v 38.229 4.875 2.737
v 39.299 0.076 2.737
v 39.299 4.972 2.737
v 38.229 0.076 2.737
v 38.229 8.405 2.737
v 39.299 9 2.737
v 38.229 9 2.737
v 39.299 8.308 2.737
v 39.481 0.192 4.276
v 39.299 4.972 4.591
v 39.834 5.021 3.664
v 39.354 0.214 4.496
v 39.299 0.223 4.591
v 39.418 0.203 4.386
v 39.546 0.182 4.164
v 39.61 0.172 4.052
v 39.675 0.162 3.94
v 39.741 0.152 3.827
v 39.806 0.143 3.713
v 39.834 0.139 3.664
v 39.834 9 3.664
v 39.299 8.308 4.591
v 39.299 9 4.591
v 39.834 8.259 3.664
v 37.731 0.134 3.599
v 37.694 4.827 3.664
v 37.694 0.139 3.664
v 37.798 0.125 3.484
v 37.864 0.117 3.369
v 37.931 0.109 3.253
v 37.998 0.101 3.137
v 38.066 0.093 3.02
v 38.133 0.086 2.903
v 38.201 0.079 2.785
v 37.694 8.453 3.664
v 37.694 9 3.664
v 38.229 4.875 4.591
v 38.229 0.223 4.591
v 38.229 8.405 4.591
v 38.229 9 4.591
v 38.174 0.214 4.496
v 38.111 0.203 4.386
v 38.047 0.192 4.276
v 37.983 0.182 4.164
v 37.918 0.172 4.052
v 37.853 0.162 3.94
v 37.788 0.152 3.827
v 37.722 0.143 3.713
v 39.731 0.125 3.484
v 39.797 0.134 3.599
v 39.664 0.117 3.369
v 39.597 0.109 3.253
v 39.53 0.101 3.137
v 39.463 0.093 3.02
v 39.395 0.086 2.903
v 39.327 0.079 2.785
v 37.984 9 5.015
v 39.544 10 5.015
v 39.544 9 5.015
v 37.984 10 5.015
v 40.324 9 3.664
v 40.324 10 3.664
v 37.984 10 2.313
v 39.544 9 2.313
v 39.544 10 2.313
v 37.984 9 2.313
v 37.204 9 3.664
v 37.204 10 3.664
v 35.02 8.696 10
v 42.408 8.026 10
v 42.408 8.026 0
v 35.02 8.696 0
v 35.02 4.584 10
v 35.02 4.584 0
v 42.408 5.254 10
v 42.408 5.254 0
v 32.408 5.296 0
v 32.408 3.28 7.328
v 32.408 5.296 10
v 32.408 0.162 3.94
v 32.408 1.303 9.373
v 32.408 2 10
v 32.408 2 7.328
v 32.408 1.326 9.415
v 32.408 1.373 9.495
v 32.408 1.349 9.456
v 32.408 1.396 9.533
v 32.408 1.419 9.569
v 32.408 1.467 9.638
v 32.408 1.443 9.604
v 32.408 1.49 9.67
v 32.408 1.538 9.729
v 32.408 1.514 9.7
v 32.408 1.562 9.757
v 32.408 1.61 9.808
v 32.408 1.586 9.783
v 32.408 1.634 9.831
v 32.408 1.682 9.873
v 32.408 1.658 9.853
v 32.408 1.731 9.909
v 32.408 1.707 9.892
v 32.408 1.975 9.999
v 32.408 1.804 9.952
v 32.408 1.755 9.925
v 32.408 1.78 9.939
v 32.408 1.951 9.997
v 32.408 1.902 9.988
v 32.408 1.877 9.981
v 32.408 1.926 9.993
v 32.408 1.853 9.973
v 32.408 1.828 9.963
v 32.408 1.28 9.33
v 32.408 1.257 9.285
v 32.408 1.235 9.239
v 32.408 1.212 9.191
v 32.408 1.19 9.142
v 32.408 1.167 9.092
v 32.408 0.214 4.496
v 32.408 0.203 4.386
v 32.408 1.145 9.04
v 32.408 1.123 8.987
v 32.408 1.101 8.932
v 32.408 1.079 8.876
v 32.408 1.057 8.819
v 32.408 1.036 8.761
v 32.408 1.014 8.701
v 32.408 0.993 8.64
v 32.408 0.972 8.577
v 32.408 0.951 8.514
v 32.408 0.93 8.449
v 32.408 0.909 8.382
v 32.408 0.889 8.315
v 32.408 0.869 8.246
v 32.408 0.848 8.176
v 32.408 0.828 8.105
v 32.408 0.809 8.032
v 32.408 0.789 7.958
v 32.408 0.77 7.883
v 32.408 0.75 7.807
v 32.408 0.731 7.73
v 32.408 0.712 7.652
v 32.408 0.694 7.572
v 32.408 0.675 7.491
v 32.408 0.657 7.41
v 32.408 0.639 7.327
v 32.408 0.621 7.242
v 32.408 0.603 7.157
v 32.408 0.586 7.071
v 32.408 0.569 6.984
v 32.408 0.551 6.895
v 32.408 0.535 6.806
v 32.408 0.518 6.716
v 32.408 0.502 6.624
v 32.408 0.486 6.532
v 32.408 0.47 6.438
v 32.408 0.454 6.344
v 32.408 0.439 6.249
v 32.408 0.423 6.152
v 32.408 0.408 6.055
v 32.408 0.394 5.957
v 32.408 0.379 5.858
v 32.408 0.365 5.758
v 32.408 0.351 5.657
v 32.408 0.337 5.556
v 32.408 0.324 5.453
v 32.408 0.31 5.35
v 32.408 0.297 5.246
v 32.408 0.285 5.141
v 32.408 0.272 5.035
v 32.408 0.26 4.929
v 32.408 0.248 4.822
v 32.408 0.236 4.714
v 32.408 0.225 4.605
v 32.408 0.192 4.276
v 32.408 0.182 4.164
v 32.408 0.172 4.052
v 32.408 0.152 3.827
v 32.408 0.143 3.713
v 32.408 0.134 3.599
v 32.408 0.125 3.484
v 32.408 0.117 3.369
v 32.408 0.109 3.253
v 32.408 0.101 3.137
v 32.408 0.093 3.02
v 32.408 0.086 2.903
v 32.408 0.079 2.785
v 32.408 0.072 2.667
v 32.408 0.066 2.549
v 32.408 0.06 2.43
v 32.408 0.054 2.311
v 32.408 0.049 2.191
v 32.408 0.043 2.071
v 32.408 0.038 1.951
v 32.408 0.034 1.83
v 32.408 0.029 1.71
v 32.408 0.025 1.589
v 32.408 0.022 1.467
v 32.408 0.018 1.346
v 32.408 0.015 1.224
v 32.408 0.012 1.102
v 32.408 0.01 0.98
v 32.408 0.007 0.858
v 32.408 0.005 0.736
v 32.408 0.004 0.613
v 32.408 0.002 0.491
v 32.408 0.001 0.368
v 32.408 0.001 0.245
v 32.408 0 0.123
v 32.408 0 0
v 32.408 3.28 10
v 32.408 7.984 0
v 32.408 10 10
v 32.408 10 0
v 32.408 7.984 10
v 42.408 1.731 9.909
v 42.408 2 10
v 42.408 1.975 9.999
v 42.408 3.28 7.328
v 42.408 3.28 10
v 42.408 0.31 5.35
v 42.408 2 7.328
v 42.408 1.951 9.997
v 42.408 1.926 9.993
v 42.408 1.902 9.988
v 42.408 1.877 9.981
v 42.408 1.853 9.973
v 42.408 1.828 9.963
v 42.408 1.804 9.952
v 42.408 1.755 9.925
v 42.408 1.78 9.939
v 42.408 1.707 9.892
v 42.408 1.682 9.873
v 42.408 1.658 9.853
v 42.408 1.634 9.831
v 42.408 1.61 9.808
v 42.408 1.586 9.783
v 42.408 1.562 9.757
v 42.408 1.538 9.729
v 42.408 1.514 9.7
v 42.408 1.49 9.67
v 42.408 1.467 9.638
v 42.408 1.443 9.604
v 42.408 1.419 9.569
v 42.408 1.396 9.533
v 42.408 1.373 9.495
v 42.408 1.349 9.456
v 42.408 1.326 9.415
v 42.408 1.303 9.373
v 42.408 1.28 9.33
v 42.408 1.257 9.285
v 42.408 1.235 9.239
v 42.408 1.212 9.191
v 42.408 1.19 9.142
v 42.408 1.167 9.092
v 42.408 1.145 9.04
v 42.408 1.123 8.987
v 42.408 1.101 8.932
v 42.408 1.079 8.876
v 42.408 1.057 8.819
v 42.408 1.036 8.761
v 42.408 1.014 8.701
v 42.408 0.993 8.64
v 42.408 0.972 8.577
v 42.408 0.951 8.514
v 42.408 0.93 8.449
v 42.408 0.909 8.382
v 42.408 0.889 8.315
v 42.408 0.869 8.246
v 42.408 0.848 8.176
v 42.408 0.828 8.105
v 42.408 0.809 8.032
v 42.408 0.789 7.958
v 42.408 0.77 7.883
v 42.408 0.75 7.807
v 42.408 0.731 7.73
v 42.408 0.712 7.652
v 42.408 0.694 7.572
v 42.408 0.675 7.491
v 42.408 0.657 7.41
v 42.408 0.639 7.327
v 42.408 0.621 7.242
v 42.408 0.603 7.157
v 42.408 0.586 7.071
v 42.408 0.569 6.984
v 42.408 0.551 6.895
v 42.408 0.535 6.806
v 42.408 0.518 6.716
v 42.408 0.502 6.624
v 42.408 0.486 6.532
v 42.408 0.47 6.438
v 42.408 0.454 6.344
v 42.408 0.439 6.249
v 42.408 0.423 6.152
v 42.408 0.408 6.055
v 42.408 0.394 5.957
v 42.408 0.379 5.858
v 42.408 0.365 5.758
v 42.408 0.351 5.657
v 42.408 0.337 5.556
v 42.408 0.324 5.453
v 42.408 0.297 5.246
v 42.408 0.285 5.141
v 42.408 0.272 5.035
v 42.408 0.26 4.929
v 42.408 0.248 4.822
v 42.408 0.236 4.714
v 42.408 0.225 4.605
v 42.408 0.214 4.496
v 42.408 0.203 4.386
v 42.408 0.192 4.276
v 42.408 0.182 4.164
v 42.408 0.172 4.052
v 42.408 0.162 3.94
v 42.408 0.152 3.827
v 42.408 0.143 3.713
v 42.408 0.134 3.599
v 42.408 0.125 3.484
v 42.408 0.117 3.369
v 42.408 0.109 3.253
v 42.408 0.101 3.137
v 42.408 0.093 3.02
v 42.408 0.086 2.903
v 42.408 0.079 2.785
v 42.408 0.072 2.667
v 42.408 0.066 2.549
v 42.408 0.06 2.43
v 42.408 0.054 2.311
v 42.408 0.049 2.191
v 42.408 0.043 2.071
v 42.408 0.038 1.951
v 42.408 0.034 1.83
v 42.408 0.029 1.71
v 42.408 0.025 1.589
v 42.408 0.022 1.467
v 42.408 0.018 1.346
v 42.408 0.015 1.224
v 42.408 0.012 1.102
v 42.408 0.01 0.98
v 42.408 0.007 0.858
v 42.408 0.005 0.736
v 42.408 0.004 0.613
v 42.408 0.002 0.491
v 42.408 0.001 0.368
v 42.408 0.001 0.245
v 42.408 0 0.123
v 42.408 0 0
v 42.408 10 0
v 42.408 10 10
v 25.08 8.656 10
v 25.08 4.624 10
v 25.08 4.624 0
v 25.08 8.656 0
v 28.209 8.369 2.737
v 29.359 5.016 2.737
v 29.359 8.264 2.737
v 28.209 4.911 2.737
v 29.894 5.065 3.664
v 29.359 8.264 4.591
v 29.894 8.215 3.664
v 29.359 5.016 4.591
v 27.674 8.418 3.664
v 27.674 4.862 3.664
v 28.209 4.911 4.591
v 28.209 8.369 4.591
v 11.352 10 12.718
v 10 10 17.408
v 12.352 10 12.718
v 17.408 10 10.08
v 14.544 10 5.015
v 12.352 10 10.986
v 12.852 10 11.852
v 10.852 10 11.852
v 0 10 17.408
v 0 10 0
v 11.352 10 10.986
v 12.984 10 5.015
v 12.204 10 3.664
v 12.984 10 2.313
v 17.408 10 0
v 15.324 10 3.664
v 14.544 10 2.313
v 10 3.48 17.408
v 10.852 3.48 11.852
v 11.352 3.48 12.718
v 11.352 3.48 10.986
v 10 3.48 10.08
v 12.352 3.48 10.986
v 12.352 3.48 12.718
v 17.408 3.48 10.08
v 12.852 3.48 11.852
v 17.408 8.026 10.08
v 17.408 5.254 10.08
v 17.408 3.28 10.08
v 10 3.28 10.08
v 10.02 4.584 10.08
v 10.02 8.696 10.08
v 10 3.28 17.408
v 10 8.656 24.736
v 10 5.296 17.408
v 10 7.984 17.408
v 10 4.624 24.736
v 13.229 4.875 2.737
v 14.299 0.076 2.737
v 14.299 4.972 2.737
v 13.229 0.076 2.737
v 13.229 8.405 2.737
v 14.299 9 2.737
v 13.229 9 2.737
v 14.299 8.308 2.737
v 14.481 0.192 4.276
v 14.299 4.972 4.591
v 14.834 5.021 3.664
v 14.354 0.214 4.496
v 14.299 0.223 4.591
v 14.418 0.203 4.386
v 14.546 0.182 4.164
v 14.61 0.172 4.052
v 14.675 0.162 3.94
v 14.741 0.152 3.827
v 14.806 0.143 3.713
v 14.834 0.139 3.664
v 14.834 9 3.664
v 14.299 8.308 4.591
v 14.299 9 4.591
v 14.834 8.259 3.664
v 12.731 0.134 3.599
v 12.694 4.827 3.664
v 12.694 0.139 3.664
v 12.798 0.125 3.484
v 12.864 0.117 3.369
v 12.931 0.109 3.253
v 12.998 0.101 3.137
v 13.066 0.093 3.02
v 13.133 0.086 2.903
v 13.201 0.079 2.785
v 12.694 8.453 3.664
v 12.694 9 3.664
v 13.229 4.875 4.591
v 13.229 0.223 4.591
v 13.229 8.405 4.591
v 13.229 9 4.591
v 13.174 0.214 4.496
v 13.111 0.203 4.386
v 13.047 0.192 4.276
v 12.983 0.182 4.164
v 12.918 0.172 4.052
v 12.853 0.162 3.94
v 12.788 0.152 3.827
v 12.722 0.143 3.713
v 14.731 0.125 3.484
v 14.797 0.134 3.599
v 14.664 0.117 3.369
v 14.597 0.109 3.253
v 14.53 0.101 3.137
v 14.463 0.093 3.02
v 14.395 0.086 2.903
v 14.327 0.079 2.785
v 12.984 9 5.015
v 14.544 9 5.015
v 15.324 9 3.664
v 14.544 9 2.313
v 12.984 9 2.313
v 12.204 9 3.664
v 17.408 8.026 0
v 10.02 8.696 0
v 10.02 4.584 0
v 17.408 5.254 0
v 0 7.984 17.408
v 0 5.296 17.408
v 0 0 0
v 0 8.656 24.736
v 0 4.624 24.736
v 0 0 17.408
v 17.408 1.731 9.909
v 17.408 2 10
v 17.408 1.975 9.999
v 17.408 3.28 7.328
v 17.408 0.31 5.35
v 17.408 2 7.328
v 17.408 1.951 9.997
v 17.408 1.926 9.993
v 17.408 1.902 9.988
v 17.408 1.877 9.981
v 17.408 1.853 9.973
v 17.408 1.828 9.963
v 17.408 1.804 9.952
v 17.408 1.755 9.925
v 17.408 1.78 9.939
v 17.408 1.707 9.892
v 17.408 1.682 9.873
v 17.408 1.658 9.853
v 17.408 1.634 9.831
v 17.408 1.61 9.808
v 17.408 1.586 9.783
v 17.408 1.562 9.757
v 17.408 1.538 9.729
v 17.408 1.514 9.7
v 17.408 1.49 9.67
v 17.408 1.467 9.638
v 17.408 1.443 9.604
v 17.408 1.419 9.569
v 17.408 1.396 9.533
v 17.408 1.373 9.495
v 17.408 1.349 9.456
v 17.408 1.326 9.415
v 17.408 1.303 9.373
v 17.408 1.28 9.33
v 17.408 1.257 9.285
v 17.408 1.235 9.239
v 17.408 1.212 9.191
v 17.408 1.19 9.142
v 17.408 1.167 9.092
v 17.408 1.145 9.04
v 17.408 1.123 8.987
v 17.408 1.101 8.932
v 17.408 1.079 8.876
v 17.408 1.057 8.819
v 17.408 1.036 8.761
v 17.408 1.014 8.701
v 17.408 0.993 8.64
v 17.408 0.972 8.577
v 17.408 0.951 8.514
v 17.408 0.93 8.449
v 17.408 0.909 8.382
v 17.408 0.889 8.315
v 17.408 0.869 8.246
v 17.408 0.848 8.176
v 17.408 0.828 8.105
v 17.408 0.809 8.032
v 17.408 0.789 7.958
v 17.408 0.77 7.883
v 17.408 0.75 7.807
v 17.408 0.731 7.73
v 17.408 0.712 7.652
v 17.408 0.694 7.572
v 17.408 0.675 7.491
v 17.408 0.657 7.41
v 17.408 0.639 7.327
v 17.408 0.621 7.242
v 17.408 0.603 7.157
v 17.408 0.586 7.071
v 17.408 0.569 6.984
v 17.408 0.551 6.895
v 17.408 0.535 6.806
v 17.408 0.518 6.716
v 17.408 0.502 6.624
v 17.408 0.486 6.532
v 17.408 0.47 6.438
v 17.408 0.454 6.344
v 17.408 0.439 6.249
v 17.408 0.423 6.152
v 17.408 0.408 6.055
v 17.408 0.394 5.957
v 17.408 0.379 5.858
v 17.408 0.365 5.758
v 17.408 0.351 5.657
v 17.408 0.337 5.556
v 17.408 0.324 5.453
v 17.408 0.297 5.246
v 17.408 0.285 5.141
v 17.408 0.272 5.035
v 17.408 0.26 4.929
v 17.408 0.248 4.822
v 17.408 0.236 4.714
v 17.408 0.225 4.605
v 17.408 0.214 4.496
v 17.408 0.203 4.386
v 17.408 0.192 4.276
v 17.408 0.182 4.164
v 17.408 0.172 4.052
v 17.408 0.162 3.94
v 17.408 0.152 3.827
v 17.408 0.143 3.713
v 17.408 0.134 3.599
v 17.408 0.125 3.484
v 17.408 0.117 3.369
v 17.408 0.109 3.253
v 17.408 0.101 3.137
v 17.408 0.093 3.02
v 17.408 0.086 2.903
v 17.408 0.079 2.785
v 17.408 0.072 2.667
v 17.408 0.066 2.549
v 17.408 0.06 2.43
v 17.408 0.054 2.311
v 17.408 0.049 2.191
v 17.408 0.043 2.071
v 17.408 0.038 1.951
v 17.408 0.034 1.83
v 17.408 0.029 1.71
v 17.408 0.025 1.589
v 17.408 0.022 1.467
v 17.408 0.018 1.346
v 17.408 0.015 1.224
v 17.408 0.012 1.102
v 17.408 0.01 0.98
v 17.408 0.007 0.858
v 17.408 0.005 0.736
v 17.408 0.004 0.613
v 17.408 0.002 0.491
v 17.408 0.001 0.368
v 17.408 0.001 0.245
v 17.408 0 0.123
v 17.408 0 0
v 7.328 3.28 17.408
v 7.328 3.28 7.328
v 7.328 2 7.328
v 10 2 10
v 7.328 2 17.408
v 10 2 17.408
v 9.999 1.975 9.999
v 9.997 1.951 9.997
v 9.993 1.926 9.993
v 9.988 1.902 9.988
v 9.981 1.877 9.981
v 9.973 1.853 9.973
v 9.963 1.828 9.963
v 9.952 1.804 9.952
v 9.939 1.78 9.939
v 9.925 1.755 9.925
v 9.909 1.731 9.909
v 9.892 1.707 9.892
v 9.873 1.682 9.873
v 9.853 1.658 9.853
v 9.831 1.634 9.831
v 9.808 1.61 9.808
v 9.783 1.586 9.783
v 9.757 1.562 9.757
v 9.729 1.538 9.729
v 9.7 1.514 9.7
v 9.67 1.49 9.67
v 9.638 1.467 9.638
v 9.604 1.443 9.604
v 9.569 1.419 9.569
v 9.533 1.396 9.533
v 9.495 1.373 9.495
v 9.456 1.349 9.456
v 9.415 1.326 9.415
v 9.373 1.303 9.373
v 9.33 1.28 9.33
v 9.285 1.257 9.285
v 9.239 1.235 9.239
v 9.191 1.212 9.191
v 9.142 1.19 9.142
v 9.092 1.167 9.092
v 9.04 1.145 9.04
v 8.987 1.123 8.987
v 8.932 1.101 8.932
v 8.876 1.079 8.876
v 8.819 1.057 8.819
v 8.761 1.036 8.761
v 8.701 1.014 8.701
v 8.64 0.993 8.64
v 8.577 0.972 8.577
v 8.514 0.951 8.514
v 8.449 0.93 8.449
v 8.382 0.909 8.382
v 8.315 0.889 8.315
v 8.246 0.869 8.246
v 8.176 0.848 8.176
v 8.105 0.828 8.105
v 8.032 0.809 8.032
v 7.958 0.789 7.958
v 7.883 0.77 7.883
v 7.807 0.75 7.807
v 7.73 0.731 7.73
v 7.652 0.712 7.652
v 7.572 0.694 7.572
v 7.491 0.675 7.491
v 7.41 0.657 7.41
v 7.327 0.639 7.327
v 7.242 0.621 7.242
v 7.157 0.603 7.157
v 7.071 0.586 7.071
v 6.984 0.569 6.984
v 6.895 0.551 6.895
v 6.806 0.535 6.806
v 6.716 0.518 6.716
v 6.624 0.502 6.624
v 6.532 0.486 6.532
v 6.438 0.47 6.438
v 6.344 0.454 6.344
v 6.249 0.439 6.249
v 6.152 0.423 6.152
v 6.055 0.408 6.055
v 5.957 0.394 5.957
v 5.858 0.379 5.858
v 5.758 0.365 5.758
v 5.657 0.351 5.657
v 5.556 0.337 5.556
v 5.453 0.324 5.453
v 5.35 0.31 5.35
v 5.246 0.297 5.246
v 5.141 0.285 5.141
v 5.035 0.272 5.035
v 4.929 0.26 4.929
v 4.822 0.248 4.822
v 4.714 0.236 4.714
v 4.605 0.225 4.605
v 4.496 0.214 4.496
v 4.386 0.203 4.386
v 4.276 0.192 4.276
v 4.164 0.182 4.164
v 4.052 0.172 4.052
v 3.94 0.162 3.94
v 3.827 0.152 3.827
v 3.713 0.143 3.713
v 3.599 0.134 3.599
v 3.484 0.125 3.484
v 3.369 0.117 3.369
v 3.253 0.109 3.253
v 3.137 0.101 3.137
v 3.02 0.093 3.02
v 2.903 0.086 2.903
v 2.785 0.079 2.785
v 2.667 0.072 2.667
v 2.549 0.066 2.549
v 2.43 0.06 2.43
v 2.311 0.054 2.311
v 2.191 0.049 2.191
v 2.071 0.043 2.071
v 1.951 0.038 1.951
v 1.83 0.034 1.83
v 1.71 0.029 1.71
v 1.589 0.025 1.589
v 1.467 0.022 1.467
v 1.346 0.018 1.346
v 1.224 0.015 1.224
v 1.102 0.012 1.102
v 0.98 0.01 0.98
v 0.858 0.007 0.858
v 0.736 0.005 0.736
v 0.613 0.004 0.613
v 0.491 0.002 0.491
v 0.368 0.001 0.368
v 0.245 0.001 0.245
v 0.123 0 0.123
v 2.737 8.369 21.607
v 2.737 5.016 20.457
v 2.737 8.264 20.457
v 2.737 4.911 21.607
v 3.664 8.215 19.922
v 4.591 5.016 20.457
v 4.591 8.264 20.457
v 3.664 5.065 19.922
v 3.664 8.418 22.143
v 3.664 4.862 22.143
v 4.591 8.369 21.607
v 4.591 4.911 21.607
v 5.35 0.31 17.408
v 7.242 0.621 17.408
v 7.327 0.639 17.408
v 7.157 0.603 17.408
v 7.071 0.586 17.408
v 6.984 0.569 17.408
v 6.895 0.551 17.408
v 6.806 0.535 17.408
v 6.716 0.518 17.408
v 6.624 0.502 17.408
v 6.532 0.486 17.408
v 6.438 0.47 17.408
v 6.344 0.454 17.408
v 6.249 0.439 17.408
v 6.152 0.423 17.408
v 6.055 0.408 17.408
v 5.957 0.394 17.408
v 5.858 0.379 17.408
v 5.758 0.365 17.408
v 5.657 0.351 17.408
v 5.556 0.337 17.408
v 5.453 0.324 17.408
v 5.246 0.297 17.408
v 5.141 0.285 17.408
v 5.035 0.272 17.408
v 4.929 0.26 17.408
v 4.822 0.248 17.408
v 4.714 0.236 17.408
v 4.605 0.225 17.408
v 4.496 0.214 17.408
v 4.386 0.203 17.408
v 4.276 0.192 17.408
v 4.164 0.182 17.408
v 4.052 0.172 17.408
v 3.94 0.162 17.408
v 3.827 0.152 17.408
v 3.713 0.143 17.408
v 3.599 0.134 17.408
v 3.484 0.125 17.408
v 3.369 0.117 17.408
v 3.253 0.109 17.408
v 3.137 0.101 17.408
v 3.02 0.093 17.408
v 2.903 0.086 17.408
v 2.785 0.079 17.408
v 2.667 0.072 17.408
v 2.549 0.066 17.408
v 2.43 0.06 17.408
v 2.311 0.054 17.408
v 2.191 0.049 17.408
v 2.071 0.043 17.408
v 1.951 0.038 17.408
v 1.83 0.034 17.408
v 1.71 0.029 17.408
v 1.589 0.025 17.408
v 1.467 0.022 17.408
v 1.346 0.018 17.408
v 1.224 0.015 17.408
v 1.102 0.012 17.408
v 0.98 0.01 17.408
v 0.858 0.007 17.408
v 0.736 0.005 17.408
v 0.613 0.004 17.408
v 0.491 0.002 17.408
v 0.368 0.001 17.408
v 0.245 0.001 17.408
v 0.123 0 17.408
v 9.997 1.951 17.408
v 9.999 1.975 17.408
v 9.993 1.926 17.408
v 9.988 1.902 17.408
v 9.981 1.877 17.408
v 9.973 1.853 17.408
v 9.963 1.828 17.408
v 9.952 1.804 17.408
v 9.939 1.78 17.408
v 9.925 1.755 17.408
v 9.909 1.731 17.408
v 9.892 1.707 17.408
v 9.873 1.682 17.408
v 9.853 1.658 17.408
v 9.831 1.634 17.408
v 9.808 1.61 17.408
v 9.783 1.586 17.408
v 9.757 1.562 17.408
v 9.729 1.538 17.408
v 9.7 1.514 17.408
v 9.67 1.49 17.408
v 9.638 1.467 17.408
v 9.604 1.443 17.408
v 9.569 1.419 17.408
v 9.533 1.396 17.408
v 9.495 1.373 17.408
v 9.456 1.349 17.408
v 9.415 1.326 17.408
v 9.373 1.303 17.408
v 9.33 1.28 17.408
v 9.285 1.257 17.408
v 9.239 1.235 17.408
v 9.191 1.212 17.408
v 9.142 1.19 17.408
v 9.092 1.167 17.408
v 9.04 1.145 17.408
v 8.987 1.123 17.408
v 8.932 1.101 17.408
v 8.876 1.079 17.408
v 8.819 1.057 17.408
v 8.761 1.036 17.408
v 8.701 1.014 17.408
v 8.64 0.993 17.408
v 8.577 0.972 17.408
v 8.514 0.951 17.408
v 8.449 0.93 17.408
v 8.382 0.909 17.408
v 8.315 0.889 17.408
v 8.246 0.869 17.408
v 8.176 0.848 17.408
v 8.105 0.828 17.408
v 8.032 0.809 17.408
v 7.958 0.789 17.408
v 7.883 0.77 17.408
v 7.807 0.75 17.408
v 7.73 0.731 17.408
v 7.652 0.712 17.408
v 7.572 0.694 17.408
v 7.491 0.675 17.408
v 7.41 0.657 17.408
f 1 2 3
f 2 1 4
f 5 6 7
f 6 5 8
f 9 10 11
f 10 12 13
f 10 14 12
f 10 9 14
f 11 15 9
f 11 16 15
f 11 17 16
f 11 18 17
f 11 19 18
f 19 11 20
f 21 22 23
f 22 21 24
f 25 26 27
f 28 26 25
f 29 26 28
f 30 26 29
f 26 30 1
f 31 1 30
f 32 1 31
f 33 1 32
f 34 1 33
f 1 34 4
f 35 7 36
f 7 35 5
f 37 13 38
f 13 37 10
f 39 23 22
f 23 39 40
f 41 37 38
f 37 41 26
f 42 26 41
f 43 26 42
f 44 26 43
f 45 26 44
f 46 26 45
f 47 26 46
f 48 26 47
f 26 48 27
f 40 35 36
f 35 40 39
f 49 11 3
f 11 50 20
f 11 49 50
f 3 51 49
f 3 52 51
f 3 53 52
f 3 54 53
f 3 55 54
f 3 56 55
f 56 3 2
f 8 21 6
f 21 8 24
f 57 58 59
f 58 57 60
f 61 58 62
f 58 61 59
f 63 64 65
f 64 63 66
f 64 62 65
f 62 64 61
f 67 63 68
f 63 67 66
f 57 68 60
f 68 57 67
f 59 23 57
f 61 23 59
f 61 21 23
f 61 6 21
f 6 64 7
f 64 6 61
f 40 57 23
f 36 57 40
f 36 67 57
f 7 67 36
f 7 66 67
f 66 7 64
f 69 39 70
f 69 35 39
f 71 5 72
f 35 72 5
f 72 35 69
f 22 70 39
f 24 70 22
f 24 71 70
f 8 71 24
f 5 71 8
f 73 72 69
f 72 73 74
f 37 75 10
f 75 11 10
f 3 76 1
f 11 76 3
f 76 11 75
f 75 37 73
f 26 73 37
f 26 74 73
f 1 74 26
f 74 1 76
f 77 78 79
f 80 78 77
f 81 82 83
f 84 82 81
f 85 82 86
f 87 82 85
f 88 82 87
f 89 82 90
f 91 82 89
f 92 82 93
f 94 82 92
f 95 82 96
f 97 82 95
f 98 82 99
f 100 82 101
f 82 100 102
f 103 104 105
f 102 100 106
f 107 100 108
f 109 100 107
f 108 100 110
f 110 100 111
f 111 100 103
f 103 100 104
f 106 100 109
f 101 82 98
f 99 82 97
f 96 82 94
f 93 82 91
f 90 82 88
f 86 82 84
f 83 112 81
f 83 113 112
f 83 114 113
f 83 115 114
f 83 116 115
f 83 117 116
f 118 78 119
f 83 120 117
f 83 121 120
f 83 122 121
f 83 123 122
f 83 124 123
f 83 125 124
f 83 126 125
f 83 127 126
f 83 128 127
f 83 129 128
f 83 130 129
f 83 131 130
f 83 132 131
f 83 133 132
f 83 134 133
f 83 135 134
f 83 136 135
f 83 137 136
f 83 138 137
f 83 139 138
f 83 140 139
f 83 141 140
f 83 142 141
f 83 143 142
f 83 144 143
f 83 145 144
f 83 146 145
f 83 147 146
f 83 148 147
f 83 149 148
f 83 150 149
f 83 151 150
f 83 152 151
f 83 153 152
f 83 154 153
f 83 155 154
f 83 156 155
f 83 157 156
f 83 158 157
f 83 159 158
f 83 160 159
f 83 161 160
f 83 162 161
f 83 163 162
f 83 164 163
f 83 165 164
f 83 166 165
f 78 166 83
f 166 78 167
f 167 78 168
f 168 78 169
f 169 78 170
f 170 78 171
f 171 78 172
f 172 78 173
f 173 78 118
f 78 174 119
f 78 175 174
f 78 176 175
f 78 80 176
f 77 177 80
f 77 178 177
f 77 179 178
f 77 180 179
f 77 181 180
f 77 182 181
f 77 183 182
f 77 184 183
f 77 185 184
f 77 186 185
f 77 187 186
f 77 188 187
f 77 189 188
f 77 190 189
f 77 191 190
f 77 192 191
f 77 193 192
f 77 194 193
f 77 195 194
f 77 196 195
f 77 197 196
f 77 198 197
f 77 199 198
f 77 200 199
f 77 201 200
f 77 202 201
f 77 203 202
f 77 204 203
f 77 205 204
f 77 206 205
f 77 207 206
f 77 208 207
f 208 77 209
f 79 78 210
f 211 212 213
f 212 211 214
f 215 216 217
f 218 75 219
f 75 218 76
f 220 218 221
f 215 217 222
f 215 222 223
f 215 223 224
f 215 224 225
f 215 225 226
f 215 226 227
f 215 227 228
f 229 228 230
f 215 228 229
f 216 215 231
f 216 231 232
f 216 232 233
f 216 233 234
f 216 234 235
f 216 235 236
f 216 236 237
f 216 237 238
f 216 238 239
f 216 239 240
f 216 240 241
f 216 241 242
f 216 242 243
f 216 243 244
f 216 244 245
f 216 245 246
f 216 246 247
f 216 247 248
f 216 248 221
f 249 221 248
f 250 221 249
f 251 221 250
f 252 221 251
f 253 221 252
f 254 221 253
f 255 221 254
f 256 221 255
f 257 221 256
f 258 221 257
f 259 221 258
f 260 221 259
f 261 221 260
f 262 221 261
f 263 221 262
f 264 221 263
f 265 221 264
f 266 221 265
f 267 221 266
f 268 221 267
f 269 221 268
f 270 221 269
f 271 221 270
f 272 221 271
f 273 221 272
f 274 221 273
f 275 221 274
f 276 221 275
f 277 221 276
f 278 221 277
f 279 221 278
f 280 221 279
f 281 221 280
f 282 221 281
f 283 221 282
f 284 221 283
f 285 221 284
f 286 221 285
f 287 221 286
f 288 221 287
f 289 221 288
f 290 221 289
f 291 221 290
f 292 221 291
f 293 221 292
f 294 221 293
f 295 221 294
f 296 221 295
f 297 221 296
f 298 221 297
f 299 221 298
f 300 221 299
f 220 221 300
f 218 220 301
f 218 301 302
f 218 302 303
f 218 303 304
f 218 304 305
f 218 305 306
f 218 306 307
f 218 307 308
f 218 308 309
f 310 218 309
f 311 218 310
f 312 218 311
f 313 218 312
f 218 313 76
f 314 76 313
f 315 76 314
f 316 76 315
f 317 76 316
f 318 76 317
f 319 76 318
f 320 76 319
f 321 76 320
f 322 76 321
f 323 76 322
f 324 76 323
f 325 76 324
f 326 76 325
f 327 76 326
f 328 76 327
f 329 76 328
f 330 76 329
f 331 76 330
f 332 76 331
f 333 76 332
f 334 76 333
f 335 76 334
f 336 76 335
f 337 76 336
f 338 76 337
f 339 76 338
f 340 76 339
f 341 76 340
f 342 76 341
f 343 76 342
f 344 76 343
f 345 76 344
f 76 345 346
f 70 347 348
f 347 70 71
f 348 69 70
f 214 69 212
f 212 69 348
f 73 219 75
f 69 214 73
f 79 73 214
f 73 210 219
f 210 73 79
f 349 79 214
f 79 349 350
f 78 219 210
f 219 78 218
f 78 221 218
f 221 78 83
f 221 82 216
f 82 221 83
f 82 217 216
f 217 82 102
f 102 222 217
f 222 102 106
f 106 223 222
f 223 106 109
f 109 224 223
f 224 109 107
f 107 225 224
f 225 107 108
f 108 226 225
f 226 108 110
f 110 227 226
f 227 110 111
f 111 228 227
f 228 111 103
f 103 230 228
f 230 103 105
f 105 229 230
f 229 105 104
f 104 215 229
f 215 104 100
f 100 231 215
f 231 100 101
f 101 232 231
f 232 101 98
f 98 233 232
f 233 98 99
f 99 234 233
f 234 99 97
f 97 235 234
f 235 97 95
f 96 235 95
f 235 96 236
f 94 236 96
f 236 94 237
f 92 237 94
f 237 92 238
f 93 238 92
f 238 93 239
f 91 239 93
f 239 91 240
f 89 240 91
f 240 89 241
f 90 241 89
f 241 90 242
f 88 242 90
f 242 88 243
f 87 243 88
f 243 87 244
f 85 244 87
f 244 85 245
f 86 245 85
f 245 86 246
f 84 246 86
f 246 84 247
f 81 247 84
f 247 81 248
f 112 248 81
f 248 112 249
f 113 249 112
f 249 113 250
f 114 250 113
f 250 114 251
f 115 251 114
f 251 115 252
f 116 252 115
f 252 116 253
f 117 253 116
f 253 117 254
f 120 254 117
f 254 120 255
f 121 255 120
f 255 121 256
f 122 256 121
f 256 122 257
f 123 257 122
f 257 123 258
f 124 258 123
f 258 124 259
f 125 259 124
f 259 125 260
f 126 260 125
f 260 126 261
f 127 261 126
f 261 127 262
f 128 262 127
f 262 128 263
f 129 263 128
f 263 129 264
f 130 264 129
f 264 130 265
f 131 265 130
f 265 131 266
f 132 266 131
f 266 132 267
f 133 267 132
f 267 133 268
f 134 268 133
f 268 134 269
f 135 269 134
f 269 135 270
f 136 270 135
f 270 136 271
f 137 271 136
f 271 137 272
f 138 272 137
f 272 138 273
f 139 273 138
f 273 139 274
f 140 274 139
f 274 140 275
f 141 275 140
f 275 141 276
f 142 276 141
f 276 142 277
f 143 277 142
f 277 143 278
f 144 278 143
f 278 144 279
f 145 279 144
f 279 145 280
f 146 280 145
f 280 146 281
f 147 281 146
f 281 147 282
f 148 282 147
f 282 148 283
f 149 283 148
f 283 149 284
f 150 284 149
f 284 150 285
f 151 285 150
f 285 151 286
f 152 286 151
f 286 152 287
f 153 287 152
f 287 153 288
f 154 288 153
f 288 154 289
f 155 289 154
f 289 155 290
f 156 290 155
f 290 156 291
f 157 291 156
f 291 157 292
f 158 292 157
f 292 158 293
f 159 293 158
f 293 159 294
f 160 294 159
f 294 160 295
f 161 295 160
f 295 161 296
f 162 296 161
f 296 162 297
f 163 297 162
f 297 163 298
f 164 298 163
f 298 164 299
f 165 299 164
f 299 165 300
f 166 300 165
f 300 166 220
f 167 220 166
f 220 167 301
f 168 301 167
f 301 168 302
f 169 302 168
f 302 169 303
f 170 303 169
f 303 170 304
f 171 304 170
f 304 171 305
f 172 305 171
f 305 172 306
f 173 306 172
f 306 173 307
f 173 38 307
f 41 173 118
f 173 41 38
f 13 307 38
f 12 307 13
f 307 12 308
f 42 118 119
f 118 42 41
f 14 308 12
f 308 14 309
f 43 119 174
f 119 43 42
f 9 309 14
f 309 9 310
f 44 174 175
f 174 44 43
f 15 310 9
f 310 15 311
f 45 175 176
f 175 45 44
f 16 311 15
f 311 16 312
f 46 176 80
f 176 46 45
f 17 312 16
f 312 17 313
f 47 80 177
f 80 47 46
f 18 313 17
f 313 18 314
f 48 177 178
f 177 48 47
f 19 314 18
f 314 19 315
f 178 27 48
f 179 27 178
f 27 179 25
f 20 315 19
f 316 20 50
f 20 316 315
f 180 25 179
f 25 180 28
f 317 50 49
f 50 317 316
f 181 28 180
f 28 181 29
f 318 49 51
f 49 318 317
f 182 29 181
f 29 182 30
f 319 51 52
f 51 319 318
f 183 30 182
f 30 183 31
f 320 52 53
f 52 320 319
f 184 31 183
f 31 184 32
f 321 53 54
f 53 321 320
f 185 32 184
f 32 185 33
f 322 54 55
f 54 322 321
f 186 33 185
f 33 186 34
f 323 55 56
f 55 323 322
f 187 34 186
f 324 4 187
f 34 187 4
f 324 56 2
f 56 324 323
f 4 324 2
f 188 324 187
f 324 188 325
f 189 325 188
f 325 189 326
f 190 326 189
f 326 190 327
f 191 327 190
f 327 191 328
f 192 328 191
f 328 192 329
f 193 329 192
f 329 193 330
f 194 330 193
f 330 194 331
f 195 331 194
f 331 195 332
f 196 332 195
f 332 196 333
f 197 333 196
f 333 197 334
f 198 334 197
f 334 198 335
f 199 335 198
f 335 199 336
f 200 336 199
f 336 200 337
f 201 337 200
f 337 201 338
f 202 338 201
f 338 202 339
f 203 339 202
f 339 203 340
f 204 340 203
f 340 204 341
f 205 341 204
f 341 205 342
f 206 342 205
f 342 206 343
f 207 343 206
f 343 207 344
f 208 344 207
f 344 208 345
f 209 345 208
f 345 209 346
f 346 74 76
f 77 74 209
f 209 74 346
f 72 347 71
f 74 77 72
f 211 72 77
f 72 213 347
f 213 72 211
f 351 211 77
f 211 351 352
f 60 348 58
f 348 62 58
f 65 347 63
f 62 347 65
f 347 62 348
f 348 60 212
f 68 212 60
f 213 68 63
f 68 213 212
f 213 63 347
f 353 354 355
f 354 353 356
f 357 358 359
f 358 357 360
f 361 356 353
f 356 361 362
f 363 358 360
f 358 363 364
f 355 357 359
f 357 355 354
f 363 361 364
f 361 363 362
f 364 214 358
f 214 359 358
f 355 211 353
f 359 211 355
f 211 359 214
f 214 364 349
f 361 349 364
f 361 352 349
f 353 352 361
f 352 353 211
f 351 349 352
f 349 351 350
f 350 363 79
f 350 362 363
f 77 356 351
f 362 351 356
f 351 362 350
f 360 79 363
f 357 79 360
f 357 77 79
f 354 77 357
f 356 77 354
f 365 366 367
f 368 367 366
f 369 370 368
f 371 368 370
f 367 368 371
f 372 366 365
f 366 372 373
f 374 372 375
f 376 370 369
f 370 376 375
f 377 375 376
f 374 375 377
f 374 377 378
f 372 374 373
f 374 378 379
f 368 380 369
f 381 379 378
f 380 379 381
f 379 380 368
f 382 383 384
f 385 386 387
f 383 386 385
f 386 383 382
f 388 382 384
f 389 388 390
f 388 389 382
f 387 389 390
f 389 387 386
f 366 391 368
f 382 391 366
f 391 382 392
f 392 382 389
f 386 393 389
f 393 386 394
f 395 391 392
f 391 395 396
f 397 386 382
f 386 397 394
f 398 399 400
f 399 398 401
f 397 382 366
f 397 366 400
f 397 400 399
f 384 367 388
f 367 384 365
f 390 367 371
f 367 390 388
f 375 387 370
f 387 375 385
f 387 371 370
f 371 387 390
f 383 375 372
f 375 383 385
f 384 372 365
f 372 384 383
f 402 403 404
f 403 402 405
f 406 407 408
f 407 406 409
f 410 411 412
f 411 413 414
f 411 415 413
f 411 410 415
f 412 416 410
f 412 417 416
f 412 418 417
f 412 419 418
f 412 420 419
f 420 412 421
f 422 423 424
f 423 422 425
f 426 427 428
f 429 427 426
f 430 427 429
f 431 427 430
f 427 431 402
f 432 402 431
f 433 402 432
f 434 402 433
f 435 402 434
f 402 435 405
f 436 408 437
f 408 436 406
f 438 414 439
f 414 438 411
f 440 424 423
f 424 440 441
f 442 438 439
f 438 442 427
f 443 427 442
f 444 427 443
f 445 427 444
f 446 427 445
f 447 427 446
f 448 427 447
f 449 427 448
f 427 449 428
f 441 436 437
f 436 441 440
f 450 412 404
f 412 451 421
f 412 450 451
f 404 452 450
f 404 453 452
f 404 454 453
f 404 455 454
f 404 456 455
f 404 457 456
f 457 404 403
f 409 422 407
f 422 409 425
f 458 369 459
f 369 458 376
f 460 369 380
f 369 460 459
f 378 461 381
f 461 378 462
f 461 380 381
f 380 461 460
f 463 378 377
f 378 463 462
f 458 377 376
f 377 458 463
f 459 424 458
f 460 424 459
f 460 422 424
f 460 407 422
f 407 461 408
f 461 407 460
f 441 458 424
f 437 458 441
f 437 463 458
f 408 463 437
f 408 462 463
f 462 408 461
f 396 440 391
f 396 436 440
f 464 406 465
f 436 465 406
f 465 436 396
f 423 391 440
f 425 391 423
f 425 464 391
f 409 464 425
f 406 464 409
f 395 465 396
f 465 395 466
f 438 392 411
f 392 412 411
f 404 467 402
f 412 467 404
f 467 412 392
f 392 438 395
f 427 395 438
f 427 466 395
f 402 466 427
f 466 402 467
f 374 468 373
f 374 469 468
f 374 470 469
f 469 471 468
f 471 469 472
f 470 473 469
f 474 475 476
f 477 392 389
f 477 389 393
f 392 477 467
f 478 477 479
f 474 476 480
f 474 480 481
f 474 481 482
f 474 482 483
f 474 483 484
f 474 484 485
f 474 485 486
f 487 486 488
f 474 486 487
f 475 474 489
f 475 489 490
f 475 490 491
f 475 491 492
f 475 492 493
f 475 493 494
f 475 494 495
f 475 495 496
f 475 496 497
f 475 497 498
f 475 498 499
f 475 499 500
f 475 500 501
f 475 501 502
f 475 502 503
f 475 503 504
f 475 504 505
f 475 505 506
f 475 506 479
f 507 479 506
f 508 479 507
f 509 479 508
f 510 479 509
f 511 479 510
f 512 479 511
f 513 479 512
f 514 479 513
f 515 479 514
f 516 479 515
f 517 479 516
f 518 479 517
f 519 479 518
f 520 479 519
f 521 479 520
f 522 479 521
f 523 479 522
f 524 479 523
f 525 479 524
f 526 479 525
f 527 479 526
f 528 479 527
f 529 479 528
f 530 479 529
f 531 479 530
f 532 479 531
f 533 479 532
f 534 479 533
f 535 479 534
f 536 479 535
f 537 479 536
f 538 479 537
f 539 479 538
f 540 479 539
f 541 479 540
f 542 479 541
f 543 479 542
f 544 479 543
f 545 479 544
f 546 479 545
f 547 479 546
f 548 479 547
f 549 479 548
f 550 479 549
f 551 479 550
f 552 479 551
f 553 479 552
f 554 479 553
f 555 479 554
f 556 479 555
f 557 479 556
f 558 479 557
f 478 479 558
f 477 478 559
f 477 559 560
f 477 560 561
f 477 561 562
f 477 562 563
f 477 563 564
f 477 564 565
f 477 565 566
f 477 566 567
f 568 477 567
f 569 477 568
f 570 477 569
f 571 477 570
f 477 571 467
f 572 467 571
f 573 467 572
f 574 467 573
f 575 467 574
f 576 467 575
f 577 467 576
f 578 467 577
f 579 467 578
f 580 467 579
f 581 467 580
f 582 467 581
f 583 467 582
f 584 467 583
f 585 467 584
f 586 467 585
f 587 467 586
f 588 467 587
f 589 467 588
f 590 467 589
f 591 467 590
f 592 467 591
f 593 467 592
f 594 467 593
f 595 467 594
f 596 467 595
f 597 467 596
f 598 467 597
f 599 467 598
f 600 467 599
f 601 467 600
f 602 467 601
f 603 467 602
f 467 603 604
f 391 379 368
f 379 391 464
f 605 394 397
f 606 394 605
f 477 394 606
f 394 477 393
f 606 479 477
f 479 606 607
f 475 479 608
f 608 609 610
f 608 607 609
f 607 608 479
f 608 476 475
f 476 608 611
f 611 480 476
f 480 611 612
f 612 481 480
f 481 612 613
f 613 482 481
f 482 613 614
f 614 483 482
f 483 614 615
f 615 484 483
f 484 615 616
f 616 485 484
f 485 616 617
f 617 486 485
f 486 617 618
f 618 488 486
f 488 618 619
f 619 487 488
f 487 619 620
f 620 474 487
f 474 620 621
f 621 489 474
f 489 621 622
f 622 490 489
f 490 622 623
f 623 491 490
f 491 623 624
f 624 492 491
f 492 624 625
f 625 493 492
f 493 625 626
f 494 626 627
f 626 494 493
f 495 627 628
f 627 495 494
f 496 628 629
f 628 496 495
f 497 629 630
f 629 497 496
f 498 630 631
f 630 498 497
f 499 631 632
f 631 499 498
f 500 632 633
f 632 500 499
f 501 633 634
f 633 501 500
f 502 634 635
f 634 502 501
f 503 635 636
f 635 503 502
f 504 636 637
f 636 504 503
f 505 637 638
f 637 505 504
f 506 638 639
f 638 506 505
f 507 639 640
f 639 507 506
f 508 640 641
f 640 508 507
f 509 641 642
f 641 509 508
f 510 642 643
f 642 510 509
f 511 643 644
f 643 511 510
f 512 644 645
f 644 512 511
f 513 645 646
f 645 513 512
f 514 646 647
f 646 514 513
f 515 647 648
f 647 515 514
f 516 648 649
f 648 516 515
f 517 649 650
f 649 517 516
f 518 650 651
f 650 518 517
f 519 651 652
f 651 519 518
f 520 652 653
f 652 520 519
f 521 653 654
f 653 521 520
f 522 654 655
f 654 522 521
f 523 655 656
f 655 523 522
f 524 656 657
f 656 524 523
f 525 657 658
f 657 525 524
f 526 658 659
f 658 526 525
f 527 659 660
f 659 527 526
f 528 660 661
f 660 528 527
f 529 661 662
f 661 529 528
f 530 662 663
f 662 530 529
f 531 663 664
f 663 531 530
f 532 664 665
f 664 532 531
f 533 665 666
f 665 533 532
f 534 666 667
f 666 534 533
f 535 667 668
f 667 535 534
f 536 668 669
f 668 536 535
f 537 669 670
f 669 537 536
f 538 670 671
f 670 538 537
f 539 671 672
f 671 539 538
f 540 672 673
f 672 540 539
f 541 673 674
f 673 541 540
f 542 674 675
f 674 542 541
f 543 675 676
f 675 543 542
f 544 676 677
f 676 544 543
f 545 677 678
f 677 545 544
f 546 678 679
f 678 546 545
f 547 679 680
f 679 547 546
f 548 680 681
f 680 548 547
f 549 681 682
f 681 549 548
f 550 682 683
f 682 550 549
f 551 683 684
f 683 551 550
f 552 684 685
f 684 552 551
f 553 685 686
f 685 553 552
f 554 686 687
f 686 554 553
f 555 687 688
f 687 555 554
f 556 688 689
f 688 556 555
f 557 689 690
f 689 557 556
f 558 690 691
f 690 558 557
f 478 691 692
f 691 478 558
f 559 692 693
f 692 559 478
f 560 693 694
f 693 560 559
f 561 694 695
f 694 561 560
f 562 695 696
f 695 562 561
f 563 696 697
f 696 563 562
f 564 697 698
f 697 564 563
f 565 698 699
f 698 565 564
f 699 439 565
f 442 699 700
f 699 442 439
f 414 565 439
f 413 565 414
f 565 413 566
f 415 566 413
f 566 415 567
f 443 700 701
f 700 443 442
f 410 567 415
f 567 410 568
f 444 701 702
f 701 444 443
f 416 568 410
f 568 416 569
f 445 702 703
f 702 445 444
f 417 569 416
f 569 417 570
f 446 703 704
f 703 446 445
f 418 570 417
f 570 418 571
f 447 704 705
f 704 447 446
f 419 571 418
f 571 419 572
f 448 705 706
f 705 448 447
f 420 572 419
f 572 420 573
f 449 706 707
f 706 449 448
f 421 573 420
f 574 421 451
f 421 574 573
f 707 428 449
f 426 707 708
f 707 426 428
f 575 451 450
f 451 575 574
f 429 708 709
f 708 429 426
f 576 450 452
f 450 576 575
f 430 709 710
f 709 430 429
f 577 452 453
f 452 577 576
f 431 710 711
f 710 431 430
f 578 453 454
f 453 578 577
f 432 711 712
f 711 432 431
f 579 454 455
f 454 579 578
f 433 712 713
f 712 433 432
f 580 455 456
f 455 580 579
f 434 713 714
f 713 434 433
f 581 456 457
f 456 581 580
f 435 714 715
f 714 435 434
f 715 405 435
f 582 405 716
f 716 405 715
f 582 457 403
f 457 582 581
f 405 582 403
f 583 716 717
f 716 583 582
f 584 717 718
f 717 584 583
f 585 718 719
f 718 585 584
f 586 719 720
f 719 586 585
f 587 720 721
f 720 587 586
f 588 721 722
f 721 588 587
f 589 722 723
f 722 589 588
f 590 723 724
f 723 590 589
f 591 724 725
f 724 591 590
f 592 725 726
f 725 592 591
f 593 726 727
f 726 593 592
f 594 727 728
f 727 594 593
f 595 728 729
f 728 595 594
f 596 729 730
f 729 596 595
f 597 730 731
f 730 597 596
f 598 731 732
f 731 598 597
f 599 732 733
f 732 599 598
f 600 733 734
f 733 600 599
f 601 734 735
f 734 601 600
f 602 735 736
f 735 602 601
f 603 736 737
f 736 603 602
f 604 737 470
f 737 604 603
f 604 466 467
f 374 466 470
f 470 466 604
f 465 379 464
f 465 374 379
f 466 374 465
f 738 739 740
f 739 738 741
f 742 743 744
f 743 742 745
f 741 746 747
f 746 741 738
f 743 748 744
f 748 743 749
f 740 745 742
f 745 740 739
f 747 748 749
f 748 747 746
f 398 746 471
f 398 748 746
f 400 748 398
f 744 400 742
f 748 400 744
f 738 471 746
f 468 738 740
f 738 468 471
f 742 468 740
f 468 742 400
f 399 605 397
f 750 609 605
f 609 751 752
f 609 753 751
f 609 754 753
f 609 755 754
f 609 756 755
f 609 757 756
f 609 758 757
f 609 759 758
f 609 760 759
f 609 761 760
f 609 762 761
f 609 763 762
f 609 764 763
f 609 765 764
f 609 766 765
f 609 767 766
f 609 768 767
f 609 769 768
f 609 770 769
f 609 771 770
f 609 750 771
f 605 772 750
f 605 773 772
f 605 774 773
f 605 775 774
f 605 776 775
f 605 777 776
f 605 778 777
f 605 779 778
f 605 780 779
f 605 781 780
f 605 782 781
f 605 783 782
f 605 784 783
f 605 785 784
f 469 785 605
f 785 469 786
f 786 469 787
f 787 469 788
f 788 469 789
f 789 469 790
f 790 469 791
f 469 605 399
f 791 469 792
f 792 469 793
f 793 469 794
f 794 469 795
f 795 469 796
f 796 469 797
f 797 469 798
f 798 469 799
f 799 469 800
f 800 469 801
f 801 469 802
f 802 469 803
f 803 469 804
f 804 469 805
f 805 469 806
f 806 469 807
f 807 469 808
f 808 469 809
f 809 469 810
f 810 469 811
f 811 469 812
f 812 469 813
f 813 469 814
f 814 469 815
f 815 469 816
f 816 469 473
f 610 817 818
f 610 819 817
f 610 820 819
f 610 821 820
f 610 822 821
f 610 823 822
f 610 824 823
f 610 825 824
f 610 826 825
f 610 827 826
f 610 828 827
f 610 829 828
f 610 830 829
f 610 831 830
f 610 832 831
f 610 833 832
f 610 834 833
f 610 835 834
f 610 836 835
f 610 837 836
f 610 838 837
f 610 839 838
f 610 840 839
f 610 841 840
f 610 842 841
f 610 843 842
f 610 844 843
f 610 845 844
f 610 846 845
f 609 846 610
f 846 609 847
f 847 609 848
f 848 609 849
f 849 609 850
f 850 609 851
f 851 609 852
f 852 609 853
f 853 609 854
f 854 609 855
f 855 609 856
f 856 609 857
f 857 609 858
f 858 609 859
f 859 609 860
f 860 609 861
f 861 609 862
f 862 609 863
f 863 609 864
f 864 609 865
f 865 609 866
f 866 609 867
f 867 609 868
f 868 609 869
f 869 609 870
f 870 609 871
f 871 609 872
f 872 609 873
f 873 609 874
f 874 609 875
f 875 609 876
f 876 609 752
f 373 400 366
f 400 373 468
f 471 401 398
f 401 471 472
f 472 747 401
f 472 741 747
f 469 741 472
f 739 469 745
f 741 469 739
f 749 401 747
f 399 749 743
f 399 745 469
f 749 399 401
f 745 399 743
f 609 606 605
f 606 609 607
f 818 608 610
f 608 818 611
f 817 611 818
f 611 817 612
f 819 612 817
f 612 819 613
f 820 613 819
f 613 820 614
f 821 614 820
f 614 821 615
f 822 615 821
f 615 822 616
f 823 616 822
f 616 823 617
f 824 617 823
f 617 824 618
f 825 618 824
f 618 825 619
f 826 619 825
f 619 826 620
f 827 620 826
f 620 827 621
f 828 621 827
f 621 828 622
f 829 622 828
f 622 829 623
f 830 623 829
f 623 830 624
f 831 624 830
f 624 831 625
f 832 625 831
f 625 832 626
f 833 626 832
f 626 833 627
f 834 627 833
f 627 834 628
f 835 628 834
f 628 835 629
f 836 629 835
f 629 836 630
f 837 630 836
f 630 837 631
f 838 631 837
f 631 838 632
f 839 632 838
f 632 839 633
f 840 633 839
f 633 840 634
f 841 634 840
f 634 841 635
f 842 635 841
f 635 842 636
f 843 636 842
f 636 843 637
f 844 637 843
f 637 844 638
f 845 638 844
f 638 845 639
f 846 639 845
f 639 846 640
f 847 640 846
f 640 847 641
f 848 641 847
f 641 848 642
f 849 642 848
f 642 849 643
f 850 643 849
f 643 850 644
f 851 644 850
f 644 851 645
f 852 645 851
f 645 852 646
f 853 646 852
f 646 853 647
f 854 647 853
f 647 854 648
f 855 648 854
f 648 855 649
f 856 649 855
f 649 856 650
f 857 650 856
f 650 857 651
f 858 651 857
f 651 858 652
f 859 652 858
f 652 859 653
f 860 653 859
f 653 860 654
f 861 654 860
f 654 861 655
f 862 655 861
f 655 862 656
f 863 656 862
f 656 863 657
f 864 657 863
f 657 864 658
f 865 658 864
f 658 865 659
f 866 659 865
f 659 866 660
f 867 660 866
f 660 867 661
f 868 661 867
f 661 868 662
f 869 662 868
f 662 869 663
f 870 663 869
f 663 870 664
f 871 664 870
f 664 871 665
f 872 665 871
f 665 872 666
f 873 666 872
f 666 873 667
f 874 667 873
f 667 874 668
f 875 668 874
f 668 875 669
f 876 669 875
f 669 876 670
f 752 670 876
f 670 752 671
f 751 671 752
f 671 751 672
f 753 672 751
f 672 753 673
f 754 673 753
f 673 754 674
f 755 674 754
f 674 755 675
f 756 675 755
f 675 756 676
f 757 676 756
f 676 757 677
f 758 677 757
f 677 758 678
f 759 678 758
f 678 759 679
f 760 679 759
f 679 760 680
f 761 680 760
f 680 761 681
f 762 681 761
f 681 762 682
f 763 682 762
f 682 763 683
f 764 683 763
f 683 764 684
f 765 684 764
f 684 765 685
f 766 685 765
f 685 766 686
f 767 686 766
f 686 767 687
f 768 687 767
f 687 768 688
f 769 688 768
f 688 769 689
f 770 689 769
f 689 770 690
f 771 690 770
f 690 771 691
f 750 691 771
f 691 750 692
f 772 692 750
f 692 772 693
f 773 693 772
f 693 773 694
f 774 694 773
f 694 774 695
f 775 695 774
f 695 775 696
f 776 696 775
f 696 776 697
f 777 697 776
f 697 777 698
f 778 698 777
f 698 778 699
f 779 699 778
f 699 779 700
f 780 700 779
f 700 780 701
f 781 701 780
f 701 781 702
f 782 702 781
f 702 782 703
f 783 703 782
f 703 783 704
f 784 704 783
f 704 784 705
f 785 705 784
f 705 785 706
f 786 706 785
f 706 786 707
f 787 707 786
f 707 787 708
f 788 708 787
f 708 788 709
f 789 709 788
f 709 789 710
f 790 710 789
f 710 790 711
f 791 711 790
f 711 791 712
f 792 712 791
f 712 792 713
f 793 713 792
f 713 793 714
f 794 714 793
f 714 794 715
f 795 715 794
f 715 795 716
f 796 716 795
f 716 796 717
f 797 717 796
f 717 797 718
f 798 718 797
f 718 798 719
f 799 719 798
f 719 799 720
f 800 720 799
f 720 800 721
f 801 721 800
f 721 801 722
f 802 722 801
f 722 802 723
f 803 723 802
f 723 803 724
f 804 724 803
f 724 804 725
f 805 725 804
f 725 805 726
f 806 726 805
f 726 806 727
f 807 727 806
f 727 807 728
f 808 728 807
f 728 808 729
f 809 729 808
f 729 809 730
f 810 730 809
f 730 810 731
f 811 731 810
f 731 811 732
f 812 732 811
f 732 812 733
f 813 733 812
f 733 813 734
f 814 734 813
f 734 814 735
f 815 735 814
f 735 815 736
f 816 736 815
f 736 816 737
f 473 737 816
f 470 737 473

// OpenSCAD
/*
Script Name: EmSCAD Puzzle Frame
Description: Generates parametric small to extra large puzzle frame segments and corners with optional dovetails, pins, and corner supports.
Repository: https://github.com/em-sea/EmSCAD/
Copyright (C) 2026 em-sea
SPDX-License-Identifier: GPL-3.0-or-later
*/

/* [Render Options] */
render_segment = true;
render_corner = true;

/* [Frame Dimensions in mm] */
use_dovetail = true;
frame_profile_type = "curved"; // ["blocks", "beveled", "curved", "stepped"]
segment_length = 10; // 0.1
// Forced to be at least back frame height + dovetail length
corner_length = 0; // 0.1
puzzle_thickness = 1.2; // 0.1
front_frame_height = 10; // 0.1
back_frame_height = 10; // 0.1
frame_thickness = 10; // 0.1
puzzle_inset_height = 3; // 0.1
puzzle_inset_depth = 2; // 0.1
frame_segment_clearance = 0.08; // 0.01

/* [Corner Support] */
corner_support = true;
// Setback for the corner support to allow ties between corners
corner_support_inset = 0.2; // 0.1
corner_support_cutout = 2; // 0.1
corner_support_sides = 6; // [3:1:180]

/* [Pin Options] */
use_pin = true;
pin_punchthrough = true;
// Filament is ~1.75 mm
pin_width = 1.75; // 0.01
pin_sides = 6; // [3:1:120]
pin_head_width = 3;  // 0.01
pin_head_sides = 6; // [3:1:120]
pin_head_inset = 1; // 0.01
pin_clearance = 0.12; // 0.01

/* [Hidden] */
$fn = ($preview) ? 32 : 128;
EPSILON = 0.02;

pin_hole_radius = (pin_width / 2) / cos(180 / pin_sides);
pin_head_hole_radius = (pin_head_width / 2) / cos(180 / pin_head_sides);

frame_core_height = max((use_pin) ? (max(pin_hole_radius * 3, pin_head_hole_radius * 2) + pin_clearance + frame_segment_clearance) * 2 : 0, front_frame_height - puzzle_inset_height - frame_segment_clearance);
frame_core_y_inset = puzzle_inset_depth + puzzle_thickness + frame_segment_clearance;
frame_core_depth = max(0.01, frame_thickness - frame_core_y_inset);

dovetail_width = frame_core_depth * 0.6;
dovetail_neck = frame_core_depth * 0.4;

connector_length = use_dovetail ? max(frame_core_depth * 0.4, (use_pin) ? (max(pin_hole_radius, pin_head_hole_radius) * 2 + pin_clearance + frame_segment_clearance) * 2 : 0) : 0;

corner_arm_length = max(corner_length - back_frame_height, use_dovetail ? (connector_length + frame_segment_clearance) : 0, (corner_support) ? corner_support_cutout * 3 : 0);

module FrameProfile(height_clearance = 0) {
    base_points = [
        [0, 0],
        [frame_thickness, 0],
        [frame_thickness, back_frame_height + height_clearance],
        [puzzle_inset_depth + puzzle_thickness + frame_segment_clearance, back_frame_height + height_clearance],
        [puzzle_inset_depth + puzzle_thickness + frame_segment_clearance, frame_core_height],
        [puzzle_inset_depth, frame_core_height],
        [puzzle_inset_depth, front_frame_height]
    ];

    if (frame_profile_type == "blocks") {
        polygon(concat(base_points, [[0, front_frame_height]]));
    } else if (frame_profile_type == "curved") {
        fn_profile = max(8, $fn);
        front_arc_points = [
            for (i = [fn_profile : -1 : 0])
                [
                    puzzle_inset_depth * (1 - cos((i / fn_profile) * 90)),
                    front_frame_height * sin((i / fn_profile) * 90)
                ]
        ];
        polygon(concat(base_points, front_arc_points));
    } else if (frame_profile_type == "beveled") {
        polygon(concat(base_points, [
            [0, front_frame_height * 0.6],
            [0, 0]
        ]));
    } else if (frame_profile_type == "stepped") {
        polygon(concat(base_points, [
            [puzzle_inset_depth * 0.5, front_frame_height],
            [puzzle_inset_depth * 0.5, front_frame_height * 0.6],
            [0, front_frame_height * 0.6],
            [0, 0]
        ]));
    }
}

module DovetailTab3D(outer_width, neck_width, length, start_z = 0, height = back_frame_height) {
    translate([0, frame_core_y_inset + frame_core_depth / 2, start_z])
        linear_extrude(height = height)
            polygon([
                [0, -neck_width / 2],
                [-length, -outer_width / 2],
                [-length, outer_width / 2],
                [0, neck_width / 2]
            ]);
}

// Lock in Y, add frame_segment_clearance to inner X
module FilamentPinCutout(clearance_value = frame_segment_clearance) {
    pin_depth = pin_punchthrough ? (frame_thickness + EPSILON * 2) : (frame_thickness - (puzzle_inset_depth / 2) + EPSILON);
    pin_start_y = pin_punchthrough ? -EPSILON : puzzle_inset_depth / 2;

    hull() {
        translate([-connector_length / 2, pin_start_y, frame_core_height / 2])
            rotate([-90, 0, 0])
                cylinder(h = pin_depth, d = pin_hole_radius * 2 + pin_clearance, $fn = pin_sides);

        if (clearance_value) {
            translate([-connector_length / 2 + clearance_value, pin_start_y, frame_core_height / 2])
                rotate([-90, 0, 0])
                    cylinder(h = pin_depth, d = pin_hole_radius * 2 + pin_clearance, $fn = pin_sides);
        }
    }
    translate([-connector_length / 2, frame_thickness - pin_head_inset, frame_core_height / 2])
        rotate([-90, 0, 0])
            cylinder(h = pin_head_inset + EPSILON, d = pin_head_width + pin_clearance, $fn = pin_head_sides);
}

module StraightSegment(length, has_start_dovetail = true, has_end_dovetail = true, height_clearance = 0) {
    real_start_conn = use_dovetail && has_start_dovetail;
    real_end_conn = use_dovetail && has_end_dovetail;

    difference() {
        rotate([90, 0, 90])
            linear_extrude(height = length)
                FrameProfile(height_clearance = height_clearance); 

        if (real_end_conn) {
            translate([length + EPSILON, 0, 0]) {
                DovetailTab3D(
                    dovetail_width + frame_segment_clearance, 
                    dovetail_neck + frame_segment_clearance, 
                    connector_length + frame_segment_clearance, 
                    start_z = -frame_segment_clearance, 
                    height = back_frame_height + frame_segment_clearance * 2
                );
                if (use_pin) {
                    FilamentPinCutout(clearance_value = 0);
                }
            }
        }
    }

    if (real_start_conn) {
        difference() {
            DovetailTab3D(dovetail_width, dovetail_neck, connector_length);
            if (use_pin) {
                FilamentPinCutout();
            }
        }
    }
}

module CornerSegment() {
    if (corner_support) {
        cutout_distance = max(0, corner_arm_length / 4);
        difference() {
            translate([0, frame_core_y_inset + frame_core_depth, 0])
                rotate([90, 0, 0])
                    linear_extrude(height = frame_core_depth - corner_support_inset)
                        polygon([
                            [back_frame_height, back_frame_height + frame_segment_clearance],
                            [back_frame_height + corner_arm_length, back_frame_height + frame_segment_clearance],
                            [back_frame_height, back_frame_height + corner_arm_length]
                        ]);
            translate([back_frame_height + cutout_distance, -EPSILON, back_frame_height + cutout_distance])
                rotate([-90, 0, 0])
                    cylinder(h = frame_thickness + EPSILON * 2, d = corner_support_cutout, $fn = corner_support_sides);
        }
    }
    StraightSegment(
        corner_arm_length + back_frame_height, 
        has_start_dovetail = false, 
        has_end_dovetail = true,
        height_clearance = frame_segment_clearance
    );
    translate([0, 0, back_frame_height + corner_arm_length])
        rotate([0, 90, 0])
            StraightSegment(
                back_frame_height + corner_arm_length, 
                has_start_dovetail = true, 
                has_end_dovetail = false
            );
}

// Do The Things
if (render_segment || $preview) {
    translate([back_frame_height + corner_arm_length + max(dovetail_width, frame_thickness) + 5, 0, 0])
        color("DodgerBlue", alpha = (render_segment == false) ? 0.3 : 1)
            StraightSegment(segment_length, has_start_dovetail = true, has_end_dovetail = true);
}

if (render_corner || $preview) {
    color("DeepPink", alpha = (render_corner == false) ? 0.3 : 1)
        CornerSegment();
}
